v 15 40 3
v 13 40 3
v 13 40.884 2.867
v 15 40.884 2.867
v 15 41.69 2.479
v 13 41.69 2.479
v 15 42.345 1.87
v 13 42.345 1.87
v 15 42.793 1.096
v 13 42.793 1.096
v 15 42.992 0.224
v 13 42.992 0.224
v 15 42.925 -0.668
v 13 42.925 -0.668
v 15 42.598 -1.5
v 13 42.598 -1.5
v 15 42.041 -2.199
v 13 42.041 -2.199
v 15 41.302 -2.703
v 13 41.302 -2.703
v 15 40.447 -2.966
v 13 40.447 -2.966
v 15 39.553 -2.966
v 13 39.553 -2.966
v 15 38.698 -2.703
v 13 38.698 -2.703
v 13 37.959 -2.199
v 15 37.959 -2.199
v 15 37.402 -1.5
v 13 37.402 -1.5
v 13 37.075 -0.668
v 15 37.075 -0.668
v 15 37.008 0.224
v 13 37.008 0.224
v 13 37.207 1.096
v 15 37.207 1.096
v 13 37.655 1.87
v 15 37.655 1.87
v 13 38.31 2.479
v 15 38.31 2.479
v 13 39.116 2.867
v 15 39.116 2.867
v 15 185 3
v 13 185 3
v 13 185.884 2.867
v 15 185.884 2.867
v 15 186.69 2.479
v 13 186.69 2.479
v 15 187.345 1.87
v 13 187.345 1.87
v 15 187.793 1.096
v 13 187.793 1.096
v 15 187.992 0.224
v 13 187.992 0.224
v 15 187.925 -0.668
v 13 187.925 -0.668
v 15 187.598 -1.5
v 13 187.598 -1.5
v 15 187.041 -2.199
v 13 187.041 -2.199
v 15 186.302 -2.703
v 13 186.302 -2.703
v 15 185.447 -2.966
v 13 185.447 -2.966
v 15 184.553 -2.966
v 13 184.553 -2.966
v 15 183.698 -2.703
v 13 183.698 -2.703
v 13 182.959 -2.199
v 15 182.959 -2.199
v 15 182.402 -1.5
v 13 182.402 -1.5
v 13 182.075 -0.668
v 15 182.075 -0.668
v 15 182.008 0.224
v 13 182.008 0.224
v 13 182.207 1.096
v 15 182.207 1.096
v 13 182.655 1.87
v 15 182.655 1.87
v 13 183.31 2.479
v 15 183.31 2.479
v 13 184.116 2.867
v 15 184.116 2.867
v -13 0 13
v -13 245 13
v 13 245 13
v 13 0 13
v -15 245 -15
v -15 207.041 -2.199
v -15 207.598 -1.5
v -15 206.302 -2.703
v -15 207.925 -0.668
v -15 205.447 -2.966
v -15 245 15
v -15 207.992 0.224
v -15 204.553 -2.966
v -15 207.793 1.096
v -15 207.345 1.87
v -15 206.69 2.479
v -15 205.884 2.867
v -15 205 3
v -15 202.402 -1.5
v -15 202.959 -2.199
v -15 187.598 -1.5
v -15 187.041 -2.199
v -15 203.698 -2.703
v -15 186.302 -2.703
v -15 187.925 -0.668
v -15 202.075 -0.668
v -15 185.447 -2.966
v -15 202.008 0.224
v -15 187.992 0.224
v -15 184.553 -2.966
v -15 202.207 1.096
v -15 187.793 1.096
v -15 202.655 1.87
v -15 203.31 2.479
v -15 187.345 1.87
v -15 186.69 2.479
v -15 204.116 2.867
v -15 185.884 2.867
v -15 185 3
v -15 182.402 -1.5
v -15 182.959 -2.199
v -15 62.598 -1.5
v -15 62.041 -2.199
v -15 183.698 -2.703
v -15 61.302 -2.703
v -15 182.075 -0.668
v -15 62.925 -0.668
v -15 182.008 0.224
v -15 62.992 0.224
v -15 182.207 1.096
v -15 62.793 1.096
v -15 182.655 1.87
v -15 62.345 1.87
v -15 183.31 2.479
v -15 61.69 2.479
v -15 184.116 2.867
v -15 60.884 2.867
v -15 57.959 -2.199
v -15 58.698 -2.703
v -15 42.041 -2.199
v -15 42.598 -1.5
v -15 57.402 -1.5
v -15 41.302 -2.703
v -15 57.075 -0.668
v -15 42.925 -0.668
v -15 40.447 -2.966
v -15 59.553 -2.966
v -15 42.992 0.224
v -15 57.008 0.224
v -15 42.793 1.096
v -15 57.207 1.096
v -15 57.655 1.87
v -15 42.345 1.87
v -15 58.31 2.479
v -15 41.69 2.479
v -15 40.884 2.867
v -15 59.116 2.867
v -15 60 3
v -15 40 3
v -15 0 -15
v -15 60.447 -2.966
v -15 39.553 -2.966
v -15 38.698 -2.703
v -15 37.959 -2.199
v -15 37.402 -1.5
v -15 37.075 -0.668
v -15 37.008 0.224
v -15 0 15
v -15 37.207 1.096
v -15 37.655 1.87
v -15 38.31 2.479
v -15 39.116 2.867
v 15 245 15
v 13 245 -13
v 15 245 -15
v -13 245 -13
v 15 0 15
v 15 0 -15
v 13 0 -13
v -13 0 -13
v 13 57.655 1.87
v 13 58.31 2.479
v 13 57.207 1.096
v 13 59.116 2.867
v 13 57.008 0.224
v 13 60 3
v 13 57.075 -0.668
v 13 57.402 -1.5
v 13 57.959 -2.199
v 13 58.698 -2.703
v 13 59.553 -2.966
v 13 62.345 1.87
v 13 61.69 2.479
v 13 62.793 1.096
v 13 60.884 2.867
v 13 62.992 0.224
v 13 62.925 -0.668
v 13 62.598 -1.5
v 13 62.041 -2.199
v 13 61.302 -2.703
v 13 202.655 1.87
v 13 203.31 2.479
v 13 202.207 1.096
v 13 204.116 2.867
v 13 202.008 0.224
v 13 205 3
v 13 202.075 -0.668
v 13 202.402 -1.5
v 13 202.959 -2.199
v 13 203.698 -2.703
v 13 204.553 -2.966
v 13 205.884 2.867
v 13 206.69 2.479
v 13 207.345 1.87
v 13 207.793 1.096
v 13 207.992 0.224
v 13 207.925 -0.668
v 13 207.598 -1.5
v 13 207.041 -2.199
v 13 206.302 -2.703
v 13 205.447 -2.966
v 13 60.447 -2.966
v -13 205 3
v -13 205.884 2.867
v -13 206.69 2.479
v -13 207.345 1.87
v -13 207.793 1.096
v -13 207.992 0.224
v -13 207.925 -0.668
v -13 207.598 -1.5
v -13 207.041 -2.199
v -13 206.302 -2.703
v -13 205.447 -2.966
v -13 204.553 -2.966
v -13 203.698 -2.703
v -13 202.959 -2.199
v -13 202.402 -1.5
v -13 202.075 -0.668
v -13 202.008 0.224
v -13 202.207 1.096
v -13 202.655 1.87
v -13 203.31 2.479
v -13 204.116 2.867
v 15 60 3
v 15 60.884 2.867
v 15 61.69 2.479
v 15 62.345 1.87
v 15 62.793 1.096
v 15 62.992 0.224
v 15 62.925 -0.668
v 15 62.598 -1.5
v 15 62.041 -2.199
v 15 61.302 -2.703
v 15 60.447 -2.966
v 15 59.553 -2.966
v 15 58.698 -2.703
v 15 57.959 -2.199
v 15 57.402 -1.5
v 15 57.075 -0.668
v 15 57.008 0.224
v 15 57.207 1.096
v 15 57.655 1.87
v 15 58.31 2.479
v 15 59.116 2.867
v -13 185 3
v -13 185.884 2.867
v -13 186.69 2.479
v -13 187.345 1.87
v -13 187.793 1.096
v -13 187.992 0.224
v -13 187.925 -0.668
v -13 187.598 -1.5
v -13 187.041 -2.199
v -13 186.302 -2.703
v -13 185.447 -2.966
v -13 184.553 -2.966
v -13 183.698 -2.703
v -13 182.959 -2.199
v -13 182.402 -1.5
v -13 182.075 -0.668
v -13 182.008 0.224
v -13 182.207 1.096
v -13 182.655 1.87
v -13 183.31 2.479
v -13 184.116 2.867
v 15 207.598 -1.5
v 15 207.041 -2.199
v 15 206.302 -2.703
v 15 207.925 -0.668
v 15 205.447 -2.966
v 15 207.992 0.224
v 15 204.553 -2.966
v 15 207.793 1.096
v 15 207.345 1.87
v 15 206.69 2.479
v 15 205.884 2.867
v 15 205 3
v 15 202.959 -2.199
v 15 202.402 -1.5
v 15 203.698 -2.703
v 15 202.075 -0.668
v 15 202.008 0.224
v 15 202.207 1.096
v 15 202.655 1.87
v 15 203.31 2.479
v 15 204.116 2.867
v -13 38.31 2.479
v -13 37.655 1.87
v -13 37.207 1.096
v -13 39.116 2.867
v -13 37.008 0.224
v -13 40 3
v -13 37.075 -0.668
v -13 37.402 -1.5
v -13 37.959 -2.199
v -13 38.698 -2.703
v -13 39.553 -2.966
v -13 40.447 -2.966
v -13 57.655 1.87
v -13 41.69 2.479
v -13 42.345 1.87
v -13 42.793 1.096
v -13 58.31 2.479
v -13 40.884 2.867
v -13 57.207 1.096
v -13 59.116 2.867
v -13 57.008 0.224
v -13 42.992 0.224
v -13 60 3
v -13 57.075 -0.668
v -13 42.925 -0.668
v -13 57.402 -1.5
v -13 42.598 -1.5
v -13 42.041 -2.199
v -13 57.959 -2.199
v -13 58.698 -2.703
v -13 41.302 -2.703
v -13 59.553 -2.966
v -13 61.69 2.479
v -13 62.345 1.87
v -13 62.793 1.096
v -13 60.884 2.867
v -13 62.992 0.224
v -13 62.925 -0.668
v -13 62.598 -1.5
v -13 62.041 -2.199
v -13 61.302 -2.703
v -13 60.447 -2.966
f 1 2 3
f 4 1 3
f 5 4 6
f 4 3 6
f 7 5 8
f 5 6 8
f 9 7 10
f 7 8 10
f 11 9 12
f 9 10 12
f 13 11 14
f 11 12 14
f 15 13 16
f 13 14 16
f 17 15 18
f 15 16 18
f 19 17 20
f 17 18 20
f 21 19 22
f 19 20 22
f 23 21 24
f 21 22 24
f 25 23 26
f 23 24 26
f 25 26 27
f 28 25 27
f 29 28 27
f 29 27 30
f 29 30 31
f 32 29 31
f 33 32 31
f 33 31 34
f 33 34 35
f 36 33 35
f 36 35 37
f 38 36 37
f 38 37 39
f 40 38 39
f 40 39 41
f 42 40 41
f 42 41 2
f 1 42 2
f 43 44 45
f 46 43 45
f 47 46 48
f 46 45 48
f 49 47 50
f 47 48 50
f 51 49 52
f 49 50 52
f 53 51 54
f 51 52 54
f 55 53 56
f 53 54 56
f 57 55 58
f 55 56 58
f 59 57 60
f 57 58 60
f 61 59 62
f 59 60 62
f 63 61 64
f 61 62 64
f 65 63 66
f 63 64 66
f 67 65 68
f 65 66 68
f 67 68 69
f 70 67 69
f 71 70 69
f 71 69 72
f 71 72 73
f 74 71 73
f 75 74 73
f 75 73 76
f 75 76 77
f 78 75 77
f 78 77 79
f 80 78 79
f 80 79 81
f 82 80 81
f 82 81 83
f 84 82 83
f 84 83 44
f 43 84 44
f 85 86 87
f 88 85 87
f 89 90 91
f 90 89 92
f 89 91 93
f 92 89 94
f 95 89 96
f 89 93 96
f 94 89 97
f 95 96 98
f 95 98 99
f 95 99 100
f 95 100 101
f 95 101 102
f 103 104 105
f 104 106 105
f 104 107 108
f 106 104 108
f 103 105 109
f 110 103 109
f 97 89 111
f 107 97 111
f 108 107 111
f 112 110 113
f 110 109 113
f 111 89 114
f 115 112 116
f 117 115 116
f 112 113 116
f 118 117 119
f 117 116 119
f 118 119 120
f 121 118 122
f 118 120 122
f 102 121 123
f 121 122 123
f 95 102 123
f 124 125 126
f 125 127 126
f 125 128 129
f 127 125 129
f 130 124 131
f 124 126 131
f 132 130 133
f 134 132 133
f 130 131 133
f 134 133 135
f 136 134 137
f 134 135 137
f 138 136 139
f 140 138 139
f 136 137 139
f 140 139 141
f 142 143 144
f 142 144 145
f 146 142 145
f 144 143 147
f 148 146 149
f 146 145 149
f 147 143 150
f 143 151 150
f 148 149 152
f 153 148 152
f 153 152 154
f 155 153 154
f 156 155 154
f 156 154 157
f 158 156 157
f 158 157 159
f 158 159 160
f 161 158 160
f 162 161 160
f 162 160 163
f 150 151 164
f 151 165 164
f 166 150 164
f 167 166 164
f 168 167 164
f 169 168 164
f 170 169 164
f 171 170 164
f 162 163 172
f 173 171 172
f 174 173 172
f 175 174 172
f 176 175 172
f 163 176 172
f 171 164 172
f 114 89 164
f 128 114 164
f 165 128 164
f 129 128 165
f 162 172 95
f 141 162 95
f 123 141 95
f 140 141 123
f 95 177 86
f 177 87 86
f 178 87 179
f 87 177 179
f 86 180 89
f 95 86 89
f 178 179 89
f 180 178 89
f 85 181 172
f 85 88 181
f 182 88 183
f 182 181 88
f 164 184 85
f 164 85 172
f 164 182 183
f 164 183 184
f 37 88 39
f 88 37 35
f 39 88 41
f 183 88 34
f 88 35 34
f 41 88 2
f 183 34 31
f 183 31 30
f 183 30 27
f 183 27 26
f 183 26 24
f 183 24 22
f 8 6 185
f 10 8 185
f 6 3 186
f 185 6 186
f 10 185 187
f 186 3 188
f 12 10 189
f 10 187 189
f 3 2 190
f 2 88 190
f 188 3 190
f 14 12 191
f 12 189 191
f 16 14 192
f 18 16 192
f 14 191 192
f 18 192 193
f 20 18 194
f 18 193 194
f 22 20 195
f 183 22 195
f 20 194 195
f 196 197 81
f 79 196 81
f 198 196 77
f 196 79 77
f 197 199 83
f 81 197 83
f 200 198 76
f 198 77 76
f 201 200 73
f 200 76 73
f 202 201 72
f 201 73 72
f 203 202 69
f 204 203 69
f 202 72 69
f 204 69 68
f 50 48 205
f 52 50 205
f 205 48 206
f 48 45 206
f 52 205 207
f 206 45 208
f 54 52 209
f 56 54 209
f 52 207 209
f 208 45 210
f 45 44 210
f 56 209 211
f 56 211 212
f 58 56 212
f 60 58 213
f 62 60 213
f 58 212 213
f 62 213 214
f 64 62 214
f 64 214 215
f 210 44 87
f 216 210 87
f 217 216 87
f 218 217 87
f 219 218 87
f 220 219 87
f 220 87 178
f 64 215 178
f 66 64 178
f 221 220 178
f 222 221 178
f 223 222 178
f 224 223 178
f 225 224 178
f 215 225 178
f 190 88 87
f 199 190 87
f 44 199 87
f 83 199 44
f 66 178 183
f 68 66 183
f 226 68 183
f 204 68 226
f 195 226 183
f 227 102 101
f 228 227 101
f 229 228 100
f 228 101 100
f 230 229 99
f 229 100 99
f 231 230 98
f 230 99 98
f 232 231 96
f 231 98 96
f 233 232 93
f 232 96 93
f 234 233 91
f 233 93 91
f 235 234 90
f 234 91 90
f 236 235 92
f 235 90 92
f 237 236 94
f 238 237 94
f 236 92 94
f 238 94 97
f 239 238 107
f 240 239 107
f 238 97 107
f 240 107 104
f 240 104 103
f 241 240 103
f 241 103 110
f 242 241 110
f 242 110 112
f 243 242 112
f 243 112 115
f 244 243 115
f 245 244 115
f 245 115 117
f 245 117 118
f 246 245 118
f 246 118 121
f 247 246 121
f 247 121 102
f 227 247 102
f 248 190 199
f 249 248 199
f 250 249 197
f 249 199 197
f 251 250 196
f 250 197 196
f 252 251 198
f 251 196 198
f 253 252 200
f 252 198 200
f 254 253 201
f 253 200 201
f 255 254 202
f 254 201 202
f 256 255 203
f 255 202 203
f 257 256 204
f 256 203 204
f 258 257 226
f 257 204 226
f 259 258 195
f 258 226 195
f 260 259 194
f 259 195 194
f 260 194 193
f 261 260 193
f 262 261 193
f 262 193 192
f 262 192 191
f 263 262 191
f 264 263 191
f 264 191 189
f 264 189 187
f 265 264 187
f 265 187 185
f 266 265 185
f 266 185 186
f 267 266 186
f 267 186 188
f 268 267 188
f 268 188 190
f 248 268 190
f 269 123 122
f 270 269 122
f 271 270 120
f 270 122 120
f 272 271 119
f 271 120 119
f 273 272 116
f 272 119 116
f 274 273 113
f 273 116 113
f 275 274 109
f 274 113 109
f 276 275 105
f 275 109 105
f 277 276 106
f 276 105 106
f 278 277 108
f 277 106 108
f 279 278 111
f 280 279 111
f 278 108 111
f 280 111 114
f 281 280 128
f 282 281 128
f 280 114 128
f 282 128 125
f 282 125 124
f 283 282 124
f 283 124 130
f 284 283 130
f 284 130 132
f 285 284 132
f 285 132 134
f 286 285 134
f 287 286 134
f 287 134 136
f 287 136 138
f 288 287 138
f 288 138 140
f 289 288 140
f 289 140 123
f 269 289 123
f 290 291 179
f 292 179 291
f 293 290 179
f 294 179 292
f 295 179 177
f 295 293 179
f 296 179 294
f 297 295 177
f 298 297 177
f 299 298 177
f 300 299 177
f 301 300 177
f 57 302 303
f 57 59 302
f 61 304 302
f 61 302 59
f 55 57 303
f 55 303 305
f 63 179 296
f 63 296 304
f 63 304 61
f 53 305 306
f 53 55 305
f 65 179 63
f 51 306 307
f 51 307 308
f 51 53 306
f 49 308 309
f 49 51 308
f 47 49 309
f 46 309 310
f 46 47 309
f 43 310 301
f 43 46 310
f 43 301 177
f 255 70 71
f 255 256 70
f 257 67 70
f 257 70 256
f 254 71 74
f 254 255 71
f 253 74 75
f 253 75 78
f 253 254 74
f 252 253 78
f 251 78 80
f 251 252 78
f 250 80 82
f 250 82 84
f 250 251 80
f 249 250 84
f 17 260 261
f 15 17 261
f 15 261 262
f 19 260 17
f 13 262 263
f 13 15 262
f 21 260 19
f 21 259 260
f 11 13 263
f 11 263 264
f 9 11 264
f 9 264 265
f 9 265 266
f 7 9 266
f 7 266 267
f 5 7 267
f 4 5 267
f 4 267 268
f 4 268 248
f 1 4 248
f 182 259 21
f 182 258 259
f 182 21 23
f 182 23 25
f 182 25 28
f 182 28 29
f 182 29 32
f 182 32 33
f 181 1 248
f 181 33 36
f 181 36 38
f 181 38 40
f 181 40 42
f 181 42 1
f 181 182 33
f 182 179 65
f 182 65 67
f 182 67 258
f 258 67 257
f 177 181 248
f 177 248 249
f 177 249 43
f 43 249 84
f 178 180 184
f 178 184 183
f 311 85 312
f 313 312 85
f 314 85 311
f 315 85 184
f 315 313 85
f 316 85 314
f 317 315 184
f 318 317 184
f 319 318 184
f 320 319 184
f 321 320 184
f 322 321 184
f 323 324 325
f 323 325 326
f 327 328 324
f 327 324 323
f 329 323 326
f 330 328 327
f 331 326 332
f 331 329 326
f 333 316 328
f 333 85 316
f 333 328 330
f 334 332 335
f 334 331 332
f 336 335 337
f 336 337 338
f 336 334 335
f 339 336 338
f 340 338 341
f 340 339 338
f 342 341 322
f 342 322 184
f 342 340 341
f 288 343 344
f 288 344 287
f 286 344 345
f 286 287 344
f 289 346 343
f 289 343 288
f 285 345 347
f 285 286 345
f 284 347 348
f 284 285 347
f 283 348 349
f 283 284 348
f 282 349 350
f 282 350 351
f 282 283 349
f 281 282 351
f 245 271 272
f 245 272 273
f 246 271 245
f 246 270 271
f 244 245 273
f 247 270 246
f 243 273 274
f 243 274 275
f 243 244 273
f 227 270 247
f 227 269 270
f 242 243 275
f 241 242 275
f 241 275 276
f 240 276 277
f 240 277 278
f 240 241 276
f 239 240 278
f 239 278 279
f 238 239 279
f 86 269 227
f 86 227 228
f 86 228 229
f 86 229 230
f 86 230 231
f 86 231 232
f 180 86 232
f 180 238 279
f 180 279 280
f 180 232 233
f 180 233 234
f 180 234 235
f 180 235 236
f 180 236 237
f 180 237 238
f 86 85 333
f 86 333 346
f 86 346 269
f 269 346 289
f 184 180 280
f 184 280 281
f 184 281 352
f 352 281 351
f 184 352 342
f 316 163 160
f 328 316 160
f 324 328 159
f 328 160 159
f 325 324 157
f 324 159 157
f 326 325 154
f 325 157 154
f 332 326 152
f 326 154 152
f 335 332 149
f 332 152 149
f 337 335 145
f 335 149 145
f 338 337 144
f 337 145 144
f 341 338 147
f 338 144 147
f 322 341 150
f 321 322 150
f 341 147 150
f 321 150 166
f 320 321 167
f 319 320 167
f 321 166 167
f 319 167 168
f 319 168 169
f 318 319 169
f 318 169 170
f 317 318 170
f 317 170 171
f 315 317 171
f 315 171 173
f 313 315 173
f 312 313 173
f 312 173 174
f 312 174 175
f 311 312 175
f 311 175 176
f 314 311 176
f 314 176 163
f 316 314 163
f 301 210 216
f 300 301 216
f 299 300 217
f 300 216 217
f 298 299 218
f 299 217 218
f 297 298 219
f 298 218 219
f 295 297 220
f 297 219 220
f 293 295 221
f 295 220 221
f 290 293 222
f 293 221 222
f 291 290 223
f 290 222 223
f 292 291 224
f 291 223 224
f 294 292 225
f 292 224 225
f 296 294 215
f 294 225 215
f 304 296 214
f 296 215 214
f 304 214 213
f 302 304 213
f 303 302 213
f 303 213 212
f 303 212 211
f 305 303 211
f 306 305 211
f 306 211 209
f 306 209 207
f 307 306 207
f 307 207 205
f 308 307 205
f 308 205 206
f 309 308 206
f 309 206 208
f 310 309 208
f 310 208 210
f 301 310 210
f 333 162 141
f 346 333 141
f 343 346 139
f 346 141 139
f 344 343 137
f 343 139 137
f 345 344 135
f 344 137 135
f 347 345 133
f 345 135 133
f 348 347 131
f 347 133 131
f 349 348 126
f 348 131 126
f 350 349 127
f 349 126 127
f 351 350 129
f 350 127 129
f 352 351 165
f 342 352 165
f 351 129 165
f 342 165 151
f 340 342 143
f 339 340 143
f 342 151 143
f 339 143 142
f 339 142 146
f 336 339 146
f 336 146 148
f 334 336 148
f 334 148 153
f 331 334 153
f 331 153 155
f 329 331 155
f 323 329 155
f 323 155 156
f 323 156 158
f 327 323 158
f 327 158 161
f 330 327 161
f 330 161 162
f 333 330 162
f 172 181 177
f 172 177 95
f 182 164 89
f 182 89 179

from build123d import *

# Parameters (mm, degrees)
BOSS_EXTRUDE1_DEPTH = 245
SKETCH2_W           = 26
SKETCH2_H           = 26
CUT_EXTRUDE1_DEPTH  = 245
SKETCH4_R           = 3
CUT_EXTRUDE3_DEPTH  = 30


with BuildPart() as part:
    # Sketch1 → Boss-Extrude1 (new body)
    with BuildSketch(Plane(origin=(0, 0, 0), x_dir=(1, 0, 0), z_dir=(0, 1, 0))):
        Polygon((-15, 0), (-15, 15), (15, 15), (15, -15), (-15, -15), align=None)
    extrude(amount=BOSS_EXTRUDE1_DEPTH)

    # Sketch2 → Cut-Extrude1 (cut)
    with BuildSketch(Plane(origin=(0, 245, 0), x_dir=(1, 0, 0), z_dir=(0, 1, 0))):
        Rectangle(SKETCH2_W, SKETCH2_H)
    extrude(amount=-CUT_EXTRUDE1_DEPTH, mode=Mode.SUBTRACT)

    # Sketch4 → Cut-Extrude3 (cut)
    with BuildSketch(Plane.ZY.offset(15)):
        with Locations((0, 205)):
            Circle(SKETCH4_R)
        with Locations((0, 185)):
            Circle(SKETCH4_R)
        with Locations((0, 60)):
            Circle(SKETCH4_R)
        with Locations((0, 40)):
            Circle(SKETCH4_R)
    extrude(amount=-CUT_EXTRUDE3_DEPTH, mode=Mode.SUBTRACT)


solid = part.part
